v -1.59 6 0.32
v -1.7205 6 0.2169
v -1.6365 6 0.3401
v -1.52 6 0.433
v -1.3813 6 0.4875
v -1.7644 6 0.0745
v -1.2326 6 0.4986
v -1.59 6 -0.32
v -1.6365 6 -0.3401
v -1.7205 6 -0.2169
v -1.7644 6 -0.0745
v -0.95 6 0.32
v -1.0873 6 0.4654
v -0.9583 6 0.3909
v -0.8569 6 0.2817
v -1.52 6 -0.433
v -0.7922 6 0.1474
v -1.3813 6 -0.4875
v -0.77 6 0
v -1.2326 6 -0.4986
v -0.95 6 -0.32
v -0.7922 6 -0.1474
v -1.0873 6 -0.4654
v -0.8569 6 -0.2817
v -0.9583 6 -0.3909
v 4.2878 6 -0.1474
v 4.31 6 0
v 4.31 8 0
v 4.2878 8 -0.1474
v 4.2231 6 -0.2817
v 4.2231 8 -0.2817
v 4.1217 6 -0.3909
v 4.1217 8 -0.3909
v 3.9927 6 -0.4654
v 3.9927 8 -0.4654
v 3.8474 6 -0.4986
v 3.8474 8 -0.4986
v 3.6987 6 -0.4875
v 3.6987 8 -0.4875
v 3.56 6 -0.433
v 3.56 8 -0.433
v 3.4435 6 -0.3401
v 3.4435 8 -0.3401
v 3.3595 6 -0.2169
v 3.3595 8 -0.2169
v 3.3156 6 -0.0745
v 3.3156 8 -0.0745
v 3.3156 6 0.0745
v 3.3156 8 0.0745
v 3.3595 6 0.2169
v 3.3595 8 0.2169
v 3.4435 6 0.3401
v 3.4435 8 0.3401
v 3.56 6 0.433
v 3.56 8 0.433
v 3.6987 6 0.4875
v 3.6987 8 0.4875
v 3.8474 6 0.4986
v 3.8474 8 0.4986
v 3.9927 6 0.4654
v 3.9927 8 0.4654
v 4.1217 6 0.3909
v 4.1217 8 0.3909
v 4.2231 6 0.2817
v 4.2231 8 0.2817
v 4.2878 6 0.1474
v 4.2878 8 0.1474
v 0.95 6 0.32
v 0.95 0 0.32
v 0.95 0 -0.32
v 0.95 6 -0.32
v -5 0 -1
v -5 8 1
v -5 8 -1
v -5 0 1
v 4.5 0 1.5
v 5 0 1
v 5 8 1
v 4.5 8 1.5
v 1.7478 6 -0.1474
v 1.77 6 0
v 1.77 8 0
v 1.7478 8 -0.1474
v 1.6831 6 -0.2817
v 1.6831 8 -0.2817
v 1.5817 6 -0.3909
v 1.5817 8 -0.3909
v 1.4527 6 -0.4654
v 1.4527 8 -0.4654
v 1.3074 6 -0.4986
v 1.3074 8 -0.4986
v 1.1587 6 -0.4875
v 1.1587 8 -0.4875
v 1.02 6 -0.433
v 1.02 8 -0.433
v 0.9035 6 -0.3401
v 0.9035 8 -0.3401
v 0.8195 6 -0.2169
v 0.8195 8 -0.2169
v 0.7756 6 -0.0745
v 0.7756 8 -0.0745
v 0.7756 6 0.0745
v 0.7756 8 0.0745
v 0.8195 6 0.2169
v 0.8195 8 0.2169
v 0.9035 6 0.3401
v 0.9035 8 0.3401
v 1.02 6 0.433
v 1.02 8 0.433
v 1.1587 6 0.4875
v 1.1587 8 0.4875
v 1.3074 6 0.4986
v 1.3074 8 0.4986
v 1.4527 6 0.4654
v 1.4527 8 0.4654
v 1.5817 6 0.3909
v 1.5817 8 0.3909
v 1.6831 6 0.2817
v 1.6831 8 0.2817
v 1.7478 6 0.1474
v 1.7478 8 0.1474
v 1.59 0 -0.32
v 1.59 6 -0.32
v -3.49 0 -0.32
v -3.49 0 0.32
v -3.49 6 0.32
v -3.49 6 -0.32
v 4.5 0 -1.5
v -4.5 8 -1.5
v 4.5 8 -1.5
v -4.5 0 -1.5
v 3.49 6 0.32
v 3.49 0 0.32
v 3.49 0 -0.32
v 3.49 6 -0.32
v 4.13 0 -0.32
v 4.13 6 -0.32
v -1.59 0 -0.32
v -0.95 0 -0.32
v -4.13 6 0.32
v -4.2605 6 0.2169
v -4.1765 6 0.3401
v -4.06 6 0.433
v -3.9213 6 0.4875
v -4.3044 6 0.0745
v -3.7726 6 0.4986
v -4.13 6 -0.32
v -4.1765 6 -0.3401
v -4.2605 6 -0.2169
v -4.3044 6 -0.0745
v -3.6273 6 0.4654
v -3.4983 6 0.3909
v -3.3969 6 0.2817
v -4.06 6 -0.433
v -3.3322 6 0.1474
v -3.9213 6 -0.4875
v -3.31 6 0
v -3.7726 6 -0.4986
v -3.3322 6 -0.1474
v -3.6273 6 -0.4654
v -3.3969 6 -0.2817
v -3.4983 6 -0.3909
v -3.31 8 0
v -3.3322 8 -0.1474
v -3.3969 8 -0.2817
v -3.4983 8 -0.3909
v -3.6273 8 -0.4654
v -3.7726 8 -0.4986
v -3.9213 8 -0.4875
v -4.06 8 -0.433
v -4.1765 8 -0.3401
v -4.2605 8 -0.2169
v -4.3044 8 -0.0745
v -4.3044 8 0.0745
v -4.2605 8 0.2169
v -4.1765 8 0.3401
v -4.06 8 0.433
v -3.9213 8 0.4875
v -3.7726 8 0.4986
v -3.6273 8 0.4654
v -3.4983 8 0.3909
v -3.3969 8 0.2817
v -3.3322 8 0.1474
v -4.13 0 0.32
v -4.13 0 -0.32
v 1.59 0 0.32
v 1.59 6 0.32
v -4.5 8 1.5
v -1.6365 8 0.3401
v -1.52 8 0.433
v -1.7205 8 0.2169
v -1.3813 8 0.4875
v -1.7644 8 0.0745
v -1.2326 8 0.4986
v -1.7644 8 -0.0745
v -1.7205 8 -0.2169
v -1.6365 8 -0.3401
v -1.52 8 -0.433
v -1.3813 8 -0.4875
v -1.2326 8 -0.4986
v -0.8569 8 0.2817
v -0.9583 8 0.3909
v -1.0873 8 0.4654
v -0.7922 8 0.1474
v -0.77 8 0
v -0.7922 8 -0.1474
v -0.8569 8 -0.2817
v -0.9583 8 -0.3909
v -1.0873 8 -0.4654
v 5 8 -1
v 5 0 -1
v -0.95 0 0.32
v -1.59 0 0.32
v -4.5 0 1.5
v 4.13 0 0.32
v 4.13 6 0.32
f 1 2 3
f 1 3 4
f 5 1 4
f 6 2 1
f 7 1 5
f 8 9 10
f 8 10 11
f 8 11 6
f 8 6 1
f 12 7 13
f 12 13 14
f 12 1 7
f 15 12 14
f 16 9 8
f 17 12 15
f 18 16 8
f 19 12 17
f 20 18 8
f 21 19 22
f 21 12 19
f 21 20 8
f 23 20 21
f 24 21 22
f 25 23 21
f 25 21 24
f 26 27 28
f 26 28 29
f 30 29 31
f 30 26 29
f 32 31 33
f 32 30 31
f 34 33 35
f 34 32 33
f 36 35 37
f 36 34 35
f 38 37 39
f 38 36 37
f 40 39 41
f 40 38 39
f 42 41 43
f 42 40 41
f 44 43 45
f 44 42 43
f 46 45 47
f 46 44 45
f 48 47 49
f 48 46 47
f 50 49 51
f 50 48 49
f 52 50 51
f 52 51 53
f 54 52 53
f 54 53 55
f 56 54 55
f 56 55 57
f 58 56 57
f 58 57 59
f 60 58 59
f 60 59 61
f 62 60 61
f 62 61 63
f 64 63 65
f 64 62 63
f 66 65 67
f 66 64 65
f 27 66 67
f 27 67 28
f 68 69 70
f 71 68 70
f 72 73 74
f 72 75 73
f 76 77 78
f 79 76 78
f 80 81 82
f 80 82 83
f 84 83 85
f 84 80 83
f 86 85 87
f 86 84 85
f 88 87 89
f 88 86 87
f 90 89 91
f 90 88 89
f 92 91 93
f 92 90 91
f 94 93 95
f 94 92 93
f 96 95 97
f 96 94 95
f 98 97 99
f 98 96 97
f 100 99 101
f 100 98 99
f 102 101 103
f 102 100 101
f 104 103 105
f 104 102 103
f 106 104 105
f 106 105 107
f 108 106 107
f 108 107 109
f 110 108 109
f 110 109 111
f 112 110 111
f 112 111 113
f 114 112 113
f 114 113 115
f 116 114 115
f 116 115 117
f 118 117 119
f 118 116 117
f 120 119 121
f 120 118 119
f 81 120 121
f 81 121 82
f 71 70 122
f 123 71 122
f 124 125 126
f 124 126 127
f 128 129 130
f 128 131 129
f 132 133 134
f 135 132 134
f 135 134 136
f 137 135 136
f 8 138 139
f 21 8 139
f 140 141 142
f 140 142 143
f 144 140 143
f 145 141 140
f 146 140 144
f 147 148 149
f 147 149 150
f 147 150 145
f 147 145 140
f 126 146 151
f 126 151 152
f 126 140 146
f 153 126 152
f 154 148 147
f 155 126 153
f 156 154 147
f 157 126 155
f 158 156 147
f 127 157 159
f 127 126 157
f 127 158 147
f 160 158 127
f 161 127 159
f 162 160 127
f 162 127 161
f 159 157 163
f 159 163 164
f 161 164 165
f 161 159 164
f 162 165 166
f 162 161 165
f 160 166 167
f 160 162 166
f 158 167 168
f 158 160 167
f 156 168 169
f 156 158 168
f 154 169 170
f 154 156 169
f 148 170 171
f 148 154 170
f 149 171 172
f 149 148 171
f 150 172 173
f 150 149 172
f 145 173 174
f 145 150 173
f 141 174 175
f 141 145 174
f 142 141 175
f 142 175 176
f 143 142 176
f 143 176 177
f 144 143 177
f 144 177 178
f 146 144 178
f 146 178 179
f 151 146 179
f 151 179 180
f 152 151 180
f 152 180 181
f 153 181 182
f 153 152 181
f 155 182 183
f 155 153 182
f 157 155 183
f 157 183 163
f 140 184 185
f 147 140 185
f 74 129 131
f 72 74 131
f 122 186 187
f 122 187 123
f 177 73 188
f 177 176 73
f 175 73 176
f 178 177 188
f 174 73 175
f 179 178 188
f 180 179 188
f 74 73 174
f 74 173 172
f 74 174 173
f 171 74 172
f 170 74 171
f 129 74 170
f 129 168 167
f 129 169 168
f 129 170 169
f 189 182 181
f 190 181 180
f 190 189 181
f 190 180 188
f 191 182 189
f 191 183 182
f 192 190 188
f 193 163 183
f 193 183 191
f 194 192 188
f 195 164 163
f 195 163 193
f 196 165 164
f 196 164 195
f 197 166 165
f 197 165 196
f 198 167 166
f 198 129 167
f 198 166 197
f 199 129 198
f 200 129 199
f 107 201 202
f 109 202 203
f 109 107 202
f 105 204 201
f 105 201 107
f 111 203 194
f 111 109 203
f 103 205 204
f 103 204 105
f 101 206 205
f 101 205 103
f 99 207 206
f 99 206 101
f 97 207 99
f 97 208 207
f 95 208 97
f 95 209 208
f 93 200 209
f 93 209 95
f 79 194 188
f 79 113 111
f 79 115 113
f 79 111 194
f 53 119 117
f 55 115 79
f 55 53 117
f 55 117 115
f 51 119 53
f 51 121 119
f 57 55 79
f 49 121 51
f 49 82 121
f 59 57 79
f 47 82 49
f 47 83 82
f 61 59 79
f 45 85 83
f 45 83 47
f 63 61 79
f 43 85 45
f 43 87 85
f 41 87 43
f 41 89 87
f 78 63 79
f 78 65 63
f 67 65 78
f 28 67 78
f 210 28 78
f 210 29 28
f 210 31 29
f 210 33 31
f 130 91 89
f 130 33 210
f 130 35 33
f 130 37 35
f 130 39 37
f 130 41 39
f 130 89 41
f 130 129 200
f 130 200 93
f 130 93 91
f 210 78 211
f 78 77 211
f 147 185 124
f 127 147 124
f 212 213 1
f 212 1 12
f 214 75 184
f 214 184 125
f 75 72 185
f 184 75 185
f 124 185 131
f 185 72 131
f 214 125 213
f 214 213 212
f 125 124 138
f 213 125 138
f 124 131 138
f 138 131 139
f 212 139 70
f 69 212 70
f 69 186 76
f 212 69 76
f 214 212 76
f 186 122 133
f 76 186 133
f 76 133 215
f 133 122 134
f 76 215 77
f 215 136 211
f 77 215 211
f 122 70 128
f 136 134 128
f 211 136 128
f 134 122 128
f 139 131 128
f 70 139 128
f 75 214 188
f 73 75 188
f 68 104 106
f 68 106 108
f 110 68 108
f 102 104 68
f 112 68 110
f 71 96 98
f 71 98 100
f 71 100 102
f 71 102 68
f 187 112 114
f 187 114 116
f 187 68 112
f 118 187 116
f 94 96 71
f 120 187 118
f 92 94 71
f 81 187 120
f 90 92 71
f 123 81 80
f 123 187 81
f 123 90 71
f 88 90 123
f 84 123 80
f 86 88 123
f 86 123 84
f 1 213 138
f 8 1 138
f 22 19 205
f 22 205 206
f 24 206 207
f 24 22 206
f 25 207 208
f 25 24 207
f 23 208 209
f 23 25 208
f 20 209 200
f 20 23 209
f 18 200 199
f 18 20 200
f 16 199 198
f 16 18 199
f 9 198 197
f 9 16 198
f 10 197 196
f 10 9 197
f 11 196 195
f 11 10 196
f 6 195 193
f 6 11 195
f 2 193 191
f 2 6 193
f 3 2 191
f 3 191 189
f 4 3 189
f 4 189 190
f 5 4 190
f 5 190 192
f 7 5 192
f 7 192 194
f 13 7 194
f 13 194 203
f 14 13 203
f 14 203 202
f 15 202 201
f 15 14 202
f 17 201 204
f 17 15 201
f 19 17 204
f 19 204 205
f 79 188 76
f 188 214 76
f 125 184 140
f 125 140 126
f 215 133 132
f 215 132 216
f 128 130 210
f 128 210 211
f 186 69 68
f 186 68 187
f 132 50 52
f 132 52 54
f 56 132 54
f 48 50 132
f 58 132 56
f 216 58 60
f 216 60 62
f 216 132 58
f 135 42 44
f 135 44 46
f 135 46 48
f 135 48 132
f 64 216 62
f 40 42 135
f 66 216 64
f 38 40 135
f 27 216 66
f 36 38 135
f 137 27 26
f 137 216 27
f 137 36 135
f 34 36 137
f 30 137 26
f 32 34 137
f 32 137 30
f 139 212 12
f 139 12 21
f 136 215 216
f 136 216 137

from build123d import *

# Parameters (mm, degrees)
SKETCH_1_W      = 10
SKETCH_1_H      = 3
SKETCH_1_W_2    = 0.64
SKETCH_1_H_2    = 0.64
EXTRUDE_1_DEPTH = 6
SKETCH_2_W      = 10
SKETCH_2_H      = 3
SKETCH_2_R      = 0.5
EXTRUDE_2_DEPTH = 2
CHAMFER_1_SIZE  = 0.5


with BuildPart() as part:
    # Эскиз1 → Бобышка-Вытянуть1 (new body)
    with BuildSketch(Plane(origin=(0, 0, 0), x_dir=(1, 0, 0), z_dir=(0, 1, 0))):
        Rectangle(SKETCH_1_W, SKETCH_1_H)
        with Locations((-3.81, 0)):
            Rectangle(SKETCH_1_W_2, SKETCH_1_H_2, mode=Mode.SUBTRACT)
        with Locations((3.81, 0)):
            Rectangle(SKETCH_1_W_2, SKETCH_1_H_2, mode=Mode.SUBTRACT)
        with Locations((-1.27, 0)):
            Rectangle(SKETCH_1_W_2, SKETCH_1_H_2, mode=Mode.SUBTRACT)
        with Locations((1.27, 0)):
            Rectangle(SKETCH_1_W_2, SKETCH_1_H_2, mode=Mode.SUBTRACT)
    extrude(amount=EXTRUDE_1_DEPTH)

    # Эскиз2 → Бобышка-Вытянуть2 (add)
    with BuildSketch(Plane(origin=(0, 6, 0), x_dir=(1, 0, 0), z_dir=(0, 1, 0))):
        Rectangle(SKETCH_2_W, SKETCH_2_H)
        with Locations((-3.81, 0)):
            Circle(SKETCH_2_R, mode=Mode.SUBTRACT)
        with Locations((-1.27, 0)):
            Circle(SKETCH_2_R, mode=Mode.SUBTRACT)
        with Locations((1.27, 0)):
            Circle(SKETCH_2_R, mode=Mode.SUBTRACT)
        with Locations((3.81, 0)):
            Circle(SKETCH_2_R, mode=Mode.SUBTRACT)
    extrude(amount=EXTRUDE_2_DEPTH)

    # Фаска1
    chamfer_1_edges = [part.edges().sort_by_distance(p)[0] for p in [
        (5, 4, 1.5),
        (-5, 4, 1.5),
        (-5, 4, -1.5),
        (5, 4, -1.5),
    ]]
    chamfer(chamfer_1_edges, length=CHAMFER_1_SIZE)


solid = part.part
